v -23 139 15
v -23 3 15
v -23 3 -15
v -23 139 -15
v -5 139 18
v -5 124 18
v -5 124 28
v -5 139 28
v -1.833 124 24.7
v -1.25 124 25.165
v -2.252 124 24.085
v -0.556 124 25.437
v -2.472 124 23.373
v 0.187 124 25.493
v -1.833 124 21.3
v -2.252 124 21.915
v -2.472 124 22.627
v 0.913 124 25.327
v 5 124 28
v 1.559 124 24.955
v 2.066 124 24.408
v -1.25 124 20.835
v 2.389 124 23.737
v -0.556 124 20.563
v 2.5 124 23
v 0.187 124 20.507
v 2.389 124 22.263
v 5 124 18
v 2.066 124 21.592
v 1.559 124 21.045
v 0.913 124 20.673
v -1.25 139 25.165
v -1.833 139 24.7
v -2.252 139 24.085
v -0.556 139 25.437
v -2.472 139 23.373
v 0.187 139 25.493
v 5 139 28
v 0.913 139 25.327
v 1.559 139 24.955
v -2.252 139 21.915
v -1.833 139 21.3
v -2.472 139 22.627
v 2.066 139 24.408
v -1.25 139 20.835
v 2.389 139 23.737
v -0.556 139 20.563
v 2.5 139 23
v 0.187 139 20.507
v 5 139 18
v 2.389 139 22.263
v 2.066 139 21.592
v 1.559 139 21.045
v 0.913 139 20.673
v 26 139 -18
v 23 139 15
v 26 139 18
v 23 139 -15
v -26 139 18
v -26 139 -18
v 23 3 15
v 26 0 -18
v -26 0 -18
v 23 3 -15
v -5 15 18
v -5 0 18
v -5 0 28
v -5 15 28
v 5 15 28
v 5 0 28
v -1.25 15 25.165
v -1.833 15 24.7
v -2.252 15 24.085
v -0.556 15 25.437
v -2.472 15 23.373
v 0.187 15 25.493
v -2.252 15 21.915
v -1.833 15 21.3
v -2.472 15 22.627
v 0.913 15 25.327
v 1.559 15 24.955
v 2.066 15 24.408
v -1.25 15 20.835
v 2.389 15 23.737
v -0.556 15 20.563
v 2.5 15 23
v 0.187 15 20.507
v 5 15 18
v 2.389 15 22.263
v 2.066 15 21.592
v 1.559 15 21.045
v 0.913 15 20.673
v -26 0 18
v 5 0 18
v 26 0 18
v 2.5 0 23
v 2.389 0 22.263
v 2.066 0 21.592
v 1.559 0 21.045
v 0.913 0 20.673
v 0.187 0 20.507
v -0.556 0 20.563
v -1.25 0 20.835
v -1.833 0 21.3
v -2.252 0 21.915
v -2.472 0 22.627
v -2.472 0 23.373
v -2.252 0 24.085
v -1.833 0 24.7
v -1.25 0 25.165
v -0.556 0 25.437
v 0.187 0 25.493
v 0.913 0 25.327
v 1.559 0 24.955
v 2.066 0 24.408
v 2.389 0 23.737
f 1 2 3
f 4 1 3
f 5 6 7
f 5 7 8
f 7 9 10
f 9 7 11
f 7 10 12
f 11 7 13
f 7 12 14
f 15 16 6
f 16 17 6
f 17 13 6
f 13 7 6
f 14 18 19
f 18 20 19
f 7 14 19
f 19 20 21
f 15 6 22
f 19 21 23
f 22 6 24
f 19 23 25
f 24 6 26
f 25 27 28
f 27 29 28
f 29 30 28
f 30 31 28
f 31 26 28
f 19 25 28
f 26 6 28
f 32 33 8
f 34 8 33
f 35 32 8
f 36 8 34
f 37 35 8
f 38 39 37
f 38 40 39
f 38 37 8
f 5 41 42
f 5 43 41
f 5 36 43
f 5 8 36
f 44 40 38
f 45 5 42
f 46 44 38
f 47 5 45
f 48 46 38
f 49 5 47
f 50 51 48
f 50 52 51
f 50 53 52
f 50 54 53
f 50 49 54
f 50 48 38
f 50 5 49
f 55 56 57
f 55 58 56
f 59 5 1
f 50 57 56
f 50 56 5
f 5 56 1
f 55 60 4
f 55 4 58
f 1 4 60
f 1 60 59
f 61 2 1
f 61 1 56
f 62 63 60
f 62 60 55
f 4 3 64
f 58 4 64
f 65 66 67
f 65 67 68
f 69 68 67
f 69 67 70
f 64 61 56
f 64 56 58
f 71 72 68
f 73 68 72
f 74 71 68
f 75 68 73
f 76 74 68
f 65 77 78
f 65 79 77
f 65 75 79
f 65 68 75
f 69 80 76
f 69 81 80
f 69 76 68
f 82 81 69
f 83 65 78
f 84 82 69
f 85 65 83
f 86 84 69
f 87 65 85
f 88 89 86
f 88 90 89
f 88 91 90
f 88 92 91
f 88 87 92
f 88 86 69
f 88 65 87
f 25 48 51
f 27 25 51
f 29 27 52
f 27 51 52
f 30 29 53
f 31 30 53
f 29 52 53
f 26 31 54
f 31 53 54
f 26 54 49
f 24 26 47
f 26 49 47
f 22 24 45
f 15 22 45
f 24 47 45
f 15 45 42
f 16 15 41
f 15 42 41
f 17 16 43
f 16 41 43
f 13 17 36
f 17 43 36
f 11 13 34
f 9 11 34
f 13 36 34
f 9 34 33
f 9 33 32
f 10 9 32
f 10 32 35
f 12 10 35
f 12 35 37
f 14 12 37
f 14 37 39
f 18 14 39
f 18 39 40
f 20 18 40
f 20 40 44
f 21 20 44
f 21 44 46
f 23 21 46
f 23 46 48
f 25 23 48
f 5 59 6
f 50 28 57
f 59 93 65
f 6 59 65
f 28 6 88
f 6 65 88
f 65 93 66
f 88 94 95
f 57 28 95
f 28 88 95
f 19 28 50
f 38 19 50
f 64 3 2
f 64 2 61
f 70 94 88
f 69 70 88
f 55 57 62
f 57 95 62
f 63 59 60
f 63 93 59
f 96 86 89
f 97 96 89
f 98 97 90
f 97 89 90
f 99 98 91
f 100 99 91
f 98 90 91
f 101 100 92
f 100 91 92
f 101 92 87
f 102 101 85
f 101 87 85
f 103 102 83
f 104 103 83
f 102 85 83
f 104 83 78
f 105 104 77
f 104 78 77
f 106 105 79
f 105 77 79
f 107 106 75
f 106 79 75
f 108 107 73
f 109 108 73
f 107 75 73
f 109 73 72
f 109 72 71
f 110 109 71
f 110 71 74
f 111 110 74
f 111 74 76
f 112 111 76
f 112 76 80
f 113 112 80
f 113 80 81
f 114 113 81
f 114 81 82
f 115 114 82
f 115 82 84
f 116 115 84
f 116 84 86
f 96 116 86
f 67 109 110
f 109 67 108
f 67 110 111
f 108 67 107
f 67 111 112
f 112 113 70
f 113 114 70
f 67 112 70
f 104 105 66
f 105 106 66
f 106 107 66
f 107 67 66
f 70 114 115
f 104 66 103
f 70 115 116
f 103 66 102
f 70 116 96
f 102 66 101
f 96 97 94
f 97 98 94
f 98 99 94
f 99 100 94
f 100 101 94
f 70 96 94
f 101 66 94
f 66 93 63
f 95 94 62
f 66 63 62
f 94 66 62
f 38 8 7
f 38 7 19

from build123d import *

# Parameters (mm, degrees)
SKETCH1_W               = 52
SKETCH1_H               = 36
BOSS_EXTRUDE1_DEPTH     = 3
BOSS_EXTRUDE2_START     = 3
SKETCH1_3_W             = 52
SKETCH1_3_H             = 36
SKETCH1_3_W_2           = 46
SKETCH1_3_H_2           = 30
BOSS_EXTRUDE2_DEPTH     = 136
SKETCH2_W               = 10
SKETCH2_H               = 15
BOSS_EXTRUDE3_DEPTH     = 10
SKETCH3_R               = 2.5
CUT_EXTRUDE1_DEPTH      = 1
CUT_EXTRUDE1_DEPTH_BACK = 140


with BuildPart() as part:
    # Sketch1 → Boss-Extrude1 (new body)
    with BuildSketch(Plane(origin=(0, 0, 0), x_dir=(1, 0, 0), z_dir=(0, 1, 0))):
        Rectangle(SKETCH1_W, SKETCH1_H)
    extrude(amount=BOSS_EXTRUDE1_DEPTH)

    # Sketch1<3> → Boss-Extrude2 (add)
    with BuildSketch(Plane(origin=(0, 0, 0), x_dir=(1, 0, 0), z_dir=(0, 1, 0)).offset(BOSS_EXTRUDE2_START)):
        Rectangle(SKETCH1_3_W, SKETCH1_3_H)
        Rectangle(SKETCH1_3_W_2, SKETCH1_3_H_2, mode=Mode.SUBTRACT)
    extrude(amount=BOSS_EXTRUDE2_DEPTH)

    # Sketch2 → Boss-Extrude3 (add)
    with BuildSketch(Plane.XY.offset(18)):
        with Locations((0, 131.5)):
            Rectangle(SKETCH2_W, SKETCH2_H)
        with Locations((0, 7.5)):
            Rectangle(SKETCH2_W, SKETCH2_H)
    extrude(amount=BOSS_EXTRUDE3_DEPTH)

    # Sketch3 → Cut-Extrude1 (cut, two sides)
    with BuildSketch(Plane(origin=(0, 139, 0), x_dir=(1, 0, 0), z_dir=(0, 1, 0))) as cut_extrude1_sk:
        with Locations((0, -23)):
            Circle(SKETCH3_R)
    extrude(amount=CUT_EXTRUDE1_DEPTH, mode=Mode.SUBTRACT)
    extrude(cut_extrude1_sk.sketch, amount=-CUT_EXTRUDE1_DEPTH_BACK, mode=Mode.SUBTRACT)


solid = part.part
